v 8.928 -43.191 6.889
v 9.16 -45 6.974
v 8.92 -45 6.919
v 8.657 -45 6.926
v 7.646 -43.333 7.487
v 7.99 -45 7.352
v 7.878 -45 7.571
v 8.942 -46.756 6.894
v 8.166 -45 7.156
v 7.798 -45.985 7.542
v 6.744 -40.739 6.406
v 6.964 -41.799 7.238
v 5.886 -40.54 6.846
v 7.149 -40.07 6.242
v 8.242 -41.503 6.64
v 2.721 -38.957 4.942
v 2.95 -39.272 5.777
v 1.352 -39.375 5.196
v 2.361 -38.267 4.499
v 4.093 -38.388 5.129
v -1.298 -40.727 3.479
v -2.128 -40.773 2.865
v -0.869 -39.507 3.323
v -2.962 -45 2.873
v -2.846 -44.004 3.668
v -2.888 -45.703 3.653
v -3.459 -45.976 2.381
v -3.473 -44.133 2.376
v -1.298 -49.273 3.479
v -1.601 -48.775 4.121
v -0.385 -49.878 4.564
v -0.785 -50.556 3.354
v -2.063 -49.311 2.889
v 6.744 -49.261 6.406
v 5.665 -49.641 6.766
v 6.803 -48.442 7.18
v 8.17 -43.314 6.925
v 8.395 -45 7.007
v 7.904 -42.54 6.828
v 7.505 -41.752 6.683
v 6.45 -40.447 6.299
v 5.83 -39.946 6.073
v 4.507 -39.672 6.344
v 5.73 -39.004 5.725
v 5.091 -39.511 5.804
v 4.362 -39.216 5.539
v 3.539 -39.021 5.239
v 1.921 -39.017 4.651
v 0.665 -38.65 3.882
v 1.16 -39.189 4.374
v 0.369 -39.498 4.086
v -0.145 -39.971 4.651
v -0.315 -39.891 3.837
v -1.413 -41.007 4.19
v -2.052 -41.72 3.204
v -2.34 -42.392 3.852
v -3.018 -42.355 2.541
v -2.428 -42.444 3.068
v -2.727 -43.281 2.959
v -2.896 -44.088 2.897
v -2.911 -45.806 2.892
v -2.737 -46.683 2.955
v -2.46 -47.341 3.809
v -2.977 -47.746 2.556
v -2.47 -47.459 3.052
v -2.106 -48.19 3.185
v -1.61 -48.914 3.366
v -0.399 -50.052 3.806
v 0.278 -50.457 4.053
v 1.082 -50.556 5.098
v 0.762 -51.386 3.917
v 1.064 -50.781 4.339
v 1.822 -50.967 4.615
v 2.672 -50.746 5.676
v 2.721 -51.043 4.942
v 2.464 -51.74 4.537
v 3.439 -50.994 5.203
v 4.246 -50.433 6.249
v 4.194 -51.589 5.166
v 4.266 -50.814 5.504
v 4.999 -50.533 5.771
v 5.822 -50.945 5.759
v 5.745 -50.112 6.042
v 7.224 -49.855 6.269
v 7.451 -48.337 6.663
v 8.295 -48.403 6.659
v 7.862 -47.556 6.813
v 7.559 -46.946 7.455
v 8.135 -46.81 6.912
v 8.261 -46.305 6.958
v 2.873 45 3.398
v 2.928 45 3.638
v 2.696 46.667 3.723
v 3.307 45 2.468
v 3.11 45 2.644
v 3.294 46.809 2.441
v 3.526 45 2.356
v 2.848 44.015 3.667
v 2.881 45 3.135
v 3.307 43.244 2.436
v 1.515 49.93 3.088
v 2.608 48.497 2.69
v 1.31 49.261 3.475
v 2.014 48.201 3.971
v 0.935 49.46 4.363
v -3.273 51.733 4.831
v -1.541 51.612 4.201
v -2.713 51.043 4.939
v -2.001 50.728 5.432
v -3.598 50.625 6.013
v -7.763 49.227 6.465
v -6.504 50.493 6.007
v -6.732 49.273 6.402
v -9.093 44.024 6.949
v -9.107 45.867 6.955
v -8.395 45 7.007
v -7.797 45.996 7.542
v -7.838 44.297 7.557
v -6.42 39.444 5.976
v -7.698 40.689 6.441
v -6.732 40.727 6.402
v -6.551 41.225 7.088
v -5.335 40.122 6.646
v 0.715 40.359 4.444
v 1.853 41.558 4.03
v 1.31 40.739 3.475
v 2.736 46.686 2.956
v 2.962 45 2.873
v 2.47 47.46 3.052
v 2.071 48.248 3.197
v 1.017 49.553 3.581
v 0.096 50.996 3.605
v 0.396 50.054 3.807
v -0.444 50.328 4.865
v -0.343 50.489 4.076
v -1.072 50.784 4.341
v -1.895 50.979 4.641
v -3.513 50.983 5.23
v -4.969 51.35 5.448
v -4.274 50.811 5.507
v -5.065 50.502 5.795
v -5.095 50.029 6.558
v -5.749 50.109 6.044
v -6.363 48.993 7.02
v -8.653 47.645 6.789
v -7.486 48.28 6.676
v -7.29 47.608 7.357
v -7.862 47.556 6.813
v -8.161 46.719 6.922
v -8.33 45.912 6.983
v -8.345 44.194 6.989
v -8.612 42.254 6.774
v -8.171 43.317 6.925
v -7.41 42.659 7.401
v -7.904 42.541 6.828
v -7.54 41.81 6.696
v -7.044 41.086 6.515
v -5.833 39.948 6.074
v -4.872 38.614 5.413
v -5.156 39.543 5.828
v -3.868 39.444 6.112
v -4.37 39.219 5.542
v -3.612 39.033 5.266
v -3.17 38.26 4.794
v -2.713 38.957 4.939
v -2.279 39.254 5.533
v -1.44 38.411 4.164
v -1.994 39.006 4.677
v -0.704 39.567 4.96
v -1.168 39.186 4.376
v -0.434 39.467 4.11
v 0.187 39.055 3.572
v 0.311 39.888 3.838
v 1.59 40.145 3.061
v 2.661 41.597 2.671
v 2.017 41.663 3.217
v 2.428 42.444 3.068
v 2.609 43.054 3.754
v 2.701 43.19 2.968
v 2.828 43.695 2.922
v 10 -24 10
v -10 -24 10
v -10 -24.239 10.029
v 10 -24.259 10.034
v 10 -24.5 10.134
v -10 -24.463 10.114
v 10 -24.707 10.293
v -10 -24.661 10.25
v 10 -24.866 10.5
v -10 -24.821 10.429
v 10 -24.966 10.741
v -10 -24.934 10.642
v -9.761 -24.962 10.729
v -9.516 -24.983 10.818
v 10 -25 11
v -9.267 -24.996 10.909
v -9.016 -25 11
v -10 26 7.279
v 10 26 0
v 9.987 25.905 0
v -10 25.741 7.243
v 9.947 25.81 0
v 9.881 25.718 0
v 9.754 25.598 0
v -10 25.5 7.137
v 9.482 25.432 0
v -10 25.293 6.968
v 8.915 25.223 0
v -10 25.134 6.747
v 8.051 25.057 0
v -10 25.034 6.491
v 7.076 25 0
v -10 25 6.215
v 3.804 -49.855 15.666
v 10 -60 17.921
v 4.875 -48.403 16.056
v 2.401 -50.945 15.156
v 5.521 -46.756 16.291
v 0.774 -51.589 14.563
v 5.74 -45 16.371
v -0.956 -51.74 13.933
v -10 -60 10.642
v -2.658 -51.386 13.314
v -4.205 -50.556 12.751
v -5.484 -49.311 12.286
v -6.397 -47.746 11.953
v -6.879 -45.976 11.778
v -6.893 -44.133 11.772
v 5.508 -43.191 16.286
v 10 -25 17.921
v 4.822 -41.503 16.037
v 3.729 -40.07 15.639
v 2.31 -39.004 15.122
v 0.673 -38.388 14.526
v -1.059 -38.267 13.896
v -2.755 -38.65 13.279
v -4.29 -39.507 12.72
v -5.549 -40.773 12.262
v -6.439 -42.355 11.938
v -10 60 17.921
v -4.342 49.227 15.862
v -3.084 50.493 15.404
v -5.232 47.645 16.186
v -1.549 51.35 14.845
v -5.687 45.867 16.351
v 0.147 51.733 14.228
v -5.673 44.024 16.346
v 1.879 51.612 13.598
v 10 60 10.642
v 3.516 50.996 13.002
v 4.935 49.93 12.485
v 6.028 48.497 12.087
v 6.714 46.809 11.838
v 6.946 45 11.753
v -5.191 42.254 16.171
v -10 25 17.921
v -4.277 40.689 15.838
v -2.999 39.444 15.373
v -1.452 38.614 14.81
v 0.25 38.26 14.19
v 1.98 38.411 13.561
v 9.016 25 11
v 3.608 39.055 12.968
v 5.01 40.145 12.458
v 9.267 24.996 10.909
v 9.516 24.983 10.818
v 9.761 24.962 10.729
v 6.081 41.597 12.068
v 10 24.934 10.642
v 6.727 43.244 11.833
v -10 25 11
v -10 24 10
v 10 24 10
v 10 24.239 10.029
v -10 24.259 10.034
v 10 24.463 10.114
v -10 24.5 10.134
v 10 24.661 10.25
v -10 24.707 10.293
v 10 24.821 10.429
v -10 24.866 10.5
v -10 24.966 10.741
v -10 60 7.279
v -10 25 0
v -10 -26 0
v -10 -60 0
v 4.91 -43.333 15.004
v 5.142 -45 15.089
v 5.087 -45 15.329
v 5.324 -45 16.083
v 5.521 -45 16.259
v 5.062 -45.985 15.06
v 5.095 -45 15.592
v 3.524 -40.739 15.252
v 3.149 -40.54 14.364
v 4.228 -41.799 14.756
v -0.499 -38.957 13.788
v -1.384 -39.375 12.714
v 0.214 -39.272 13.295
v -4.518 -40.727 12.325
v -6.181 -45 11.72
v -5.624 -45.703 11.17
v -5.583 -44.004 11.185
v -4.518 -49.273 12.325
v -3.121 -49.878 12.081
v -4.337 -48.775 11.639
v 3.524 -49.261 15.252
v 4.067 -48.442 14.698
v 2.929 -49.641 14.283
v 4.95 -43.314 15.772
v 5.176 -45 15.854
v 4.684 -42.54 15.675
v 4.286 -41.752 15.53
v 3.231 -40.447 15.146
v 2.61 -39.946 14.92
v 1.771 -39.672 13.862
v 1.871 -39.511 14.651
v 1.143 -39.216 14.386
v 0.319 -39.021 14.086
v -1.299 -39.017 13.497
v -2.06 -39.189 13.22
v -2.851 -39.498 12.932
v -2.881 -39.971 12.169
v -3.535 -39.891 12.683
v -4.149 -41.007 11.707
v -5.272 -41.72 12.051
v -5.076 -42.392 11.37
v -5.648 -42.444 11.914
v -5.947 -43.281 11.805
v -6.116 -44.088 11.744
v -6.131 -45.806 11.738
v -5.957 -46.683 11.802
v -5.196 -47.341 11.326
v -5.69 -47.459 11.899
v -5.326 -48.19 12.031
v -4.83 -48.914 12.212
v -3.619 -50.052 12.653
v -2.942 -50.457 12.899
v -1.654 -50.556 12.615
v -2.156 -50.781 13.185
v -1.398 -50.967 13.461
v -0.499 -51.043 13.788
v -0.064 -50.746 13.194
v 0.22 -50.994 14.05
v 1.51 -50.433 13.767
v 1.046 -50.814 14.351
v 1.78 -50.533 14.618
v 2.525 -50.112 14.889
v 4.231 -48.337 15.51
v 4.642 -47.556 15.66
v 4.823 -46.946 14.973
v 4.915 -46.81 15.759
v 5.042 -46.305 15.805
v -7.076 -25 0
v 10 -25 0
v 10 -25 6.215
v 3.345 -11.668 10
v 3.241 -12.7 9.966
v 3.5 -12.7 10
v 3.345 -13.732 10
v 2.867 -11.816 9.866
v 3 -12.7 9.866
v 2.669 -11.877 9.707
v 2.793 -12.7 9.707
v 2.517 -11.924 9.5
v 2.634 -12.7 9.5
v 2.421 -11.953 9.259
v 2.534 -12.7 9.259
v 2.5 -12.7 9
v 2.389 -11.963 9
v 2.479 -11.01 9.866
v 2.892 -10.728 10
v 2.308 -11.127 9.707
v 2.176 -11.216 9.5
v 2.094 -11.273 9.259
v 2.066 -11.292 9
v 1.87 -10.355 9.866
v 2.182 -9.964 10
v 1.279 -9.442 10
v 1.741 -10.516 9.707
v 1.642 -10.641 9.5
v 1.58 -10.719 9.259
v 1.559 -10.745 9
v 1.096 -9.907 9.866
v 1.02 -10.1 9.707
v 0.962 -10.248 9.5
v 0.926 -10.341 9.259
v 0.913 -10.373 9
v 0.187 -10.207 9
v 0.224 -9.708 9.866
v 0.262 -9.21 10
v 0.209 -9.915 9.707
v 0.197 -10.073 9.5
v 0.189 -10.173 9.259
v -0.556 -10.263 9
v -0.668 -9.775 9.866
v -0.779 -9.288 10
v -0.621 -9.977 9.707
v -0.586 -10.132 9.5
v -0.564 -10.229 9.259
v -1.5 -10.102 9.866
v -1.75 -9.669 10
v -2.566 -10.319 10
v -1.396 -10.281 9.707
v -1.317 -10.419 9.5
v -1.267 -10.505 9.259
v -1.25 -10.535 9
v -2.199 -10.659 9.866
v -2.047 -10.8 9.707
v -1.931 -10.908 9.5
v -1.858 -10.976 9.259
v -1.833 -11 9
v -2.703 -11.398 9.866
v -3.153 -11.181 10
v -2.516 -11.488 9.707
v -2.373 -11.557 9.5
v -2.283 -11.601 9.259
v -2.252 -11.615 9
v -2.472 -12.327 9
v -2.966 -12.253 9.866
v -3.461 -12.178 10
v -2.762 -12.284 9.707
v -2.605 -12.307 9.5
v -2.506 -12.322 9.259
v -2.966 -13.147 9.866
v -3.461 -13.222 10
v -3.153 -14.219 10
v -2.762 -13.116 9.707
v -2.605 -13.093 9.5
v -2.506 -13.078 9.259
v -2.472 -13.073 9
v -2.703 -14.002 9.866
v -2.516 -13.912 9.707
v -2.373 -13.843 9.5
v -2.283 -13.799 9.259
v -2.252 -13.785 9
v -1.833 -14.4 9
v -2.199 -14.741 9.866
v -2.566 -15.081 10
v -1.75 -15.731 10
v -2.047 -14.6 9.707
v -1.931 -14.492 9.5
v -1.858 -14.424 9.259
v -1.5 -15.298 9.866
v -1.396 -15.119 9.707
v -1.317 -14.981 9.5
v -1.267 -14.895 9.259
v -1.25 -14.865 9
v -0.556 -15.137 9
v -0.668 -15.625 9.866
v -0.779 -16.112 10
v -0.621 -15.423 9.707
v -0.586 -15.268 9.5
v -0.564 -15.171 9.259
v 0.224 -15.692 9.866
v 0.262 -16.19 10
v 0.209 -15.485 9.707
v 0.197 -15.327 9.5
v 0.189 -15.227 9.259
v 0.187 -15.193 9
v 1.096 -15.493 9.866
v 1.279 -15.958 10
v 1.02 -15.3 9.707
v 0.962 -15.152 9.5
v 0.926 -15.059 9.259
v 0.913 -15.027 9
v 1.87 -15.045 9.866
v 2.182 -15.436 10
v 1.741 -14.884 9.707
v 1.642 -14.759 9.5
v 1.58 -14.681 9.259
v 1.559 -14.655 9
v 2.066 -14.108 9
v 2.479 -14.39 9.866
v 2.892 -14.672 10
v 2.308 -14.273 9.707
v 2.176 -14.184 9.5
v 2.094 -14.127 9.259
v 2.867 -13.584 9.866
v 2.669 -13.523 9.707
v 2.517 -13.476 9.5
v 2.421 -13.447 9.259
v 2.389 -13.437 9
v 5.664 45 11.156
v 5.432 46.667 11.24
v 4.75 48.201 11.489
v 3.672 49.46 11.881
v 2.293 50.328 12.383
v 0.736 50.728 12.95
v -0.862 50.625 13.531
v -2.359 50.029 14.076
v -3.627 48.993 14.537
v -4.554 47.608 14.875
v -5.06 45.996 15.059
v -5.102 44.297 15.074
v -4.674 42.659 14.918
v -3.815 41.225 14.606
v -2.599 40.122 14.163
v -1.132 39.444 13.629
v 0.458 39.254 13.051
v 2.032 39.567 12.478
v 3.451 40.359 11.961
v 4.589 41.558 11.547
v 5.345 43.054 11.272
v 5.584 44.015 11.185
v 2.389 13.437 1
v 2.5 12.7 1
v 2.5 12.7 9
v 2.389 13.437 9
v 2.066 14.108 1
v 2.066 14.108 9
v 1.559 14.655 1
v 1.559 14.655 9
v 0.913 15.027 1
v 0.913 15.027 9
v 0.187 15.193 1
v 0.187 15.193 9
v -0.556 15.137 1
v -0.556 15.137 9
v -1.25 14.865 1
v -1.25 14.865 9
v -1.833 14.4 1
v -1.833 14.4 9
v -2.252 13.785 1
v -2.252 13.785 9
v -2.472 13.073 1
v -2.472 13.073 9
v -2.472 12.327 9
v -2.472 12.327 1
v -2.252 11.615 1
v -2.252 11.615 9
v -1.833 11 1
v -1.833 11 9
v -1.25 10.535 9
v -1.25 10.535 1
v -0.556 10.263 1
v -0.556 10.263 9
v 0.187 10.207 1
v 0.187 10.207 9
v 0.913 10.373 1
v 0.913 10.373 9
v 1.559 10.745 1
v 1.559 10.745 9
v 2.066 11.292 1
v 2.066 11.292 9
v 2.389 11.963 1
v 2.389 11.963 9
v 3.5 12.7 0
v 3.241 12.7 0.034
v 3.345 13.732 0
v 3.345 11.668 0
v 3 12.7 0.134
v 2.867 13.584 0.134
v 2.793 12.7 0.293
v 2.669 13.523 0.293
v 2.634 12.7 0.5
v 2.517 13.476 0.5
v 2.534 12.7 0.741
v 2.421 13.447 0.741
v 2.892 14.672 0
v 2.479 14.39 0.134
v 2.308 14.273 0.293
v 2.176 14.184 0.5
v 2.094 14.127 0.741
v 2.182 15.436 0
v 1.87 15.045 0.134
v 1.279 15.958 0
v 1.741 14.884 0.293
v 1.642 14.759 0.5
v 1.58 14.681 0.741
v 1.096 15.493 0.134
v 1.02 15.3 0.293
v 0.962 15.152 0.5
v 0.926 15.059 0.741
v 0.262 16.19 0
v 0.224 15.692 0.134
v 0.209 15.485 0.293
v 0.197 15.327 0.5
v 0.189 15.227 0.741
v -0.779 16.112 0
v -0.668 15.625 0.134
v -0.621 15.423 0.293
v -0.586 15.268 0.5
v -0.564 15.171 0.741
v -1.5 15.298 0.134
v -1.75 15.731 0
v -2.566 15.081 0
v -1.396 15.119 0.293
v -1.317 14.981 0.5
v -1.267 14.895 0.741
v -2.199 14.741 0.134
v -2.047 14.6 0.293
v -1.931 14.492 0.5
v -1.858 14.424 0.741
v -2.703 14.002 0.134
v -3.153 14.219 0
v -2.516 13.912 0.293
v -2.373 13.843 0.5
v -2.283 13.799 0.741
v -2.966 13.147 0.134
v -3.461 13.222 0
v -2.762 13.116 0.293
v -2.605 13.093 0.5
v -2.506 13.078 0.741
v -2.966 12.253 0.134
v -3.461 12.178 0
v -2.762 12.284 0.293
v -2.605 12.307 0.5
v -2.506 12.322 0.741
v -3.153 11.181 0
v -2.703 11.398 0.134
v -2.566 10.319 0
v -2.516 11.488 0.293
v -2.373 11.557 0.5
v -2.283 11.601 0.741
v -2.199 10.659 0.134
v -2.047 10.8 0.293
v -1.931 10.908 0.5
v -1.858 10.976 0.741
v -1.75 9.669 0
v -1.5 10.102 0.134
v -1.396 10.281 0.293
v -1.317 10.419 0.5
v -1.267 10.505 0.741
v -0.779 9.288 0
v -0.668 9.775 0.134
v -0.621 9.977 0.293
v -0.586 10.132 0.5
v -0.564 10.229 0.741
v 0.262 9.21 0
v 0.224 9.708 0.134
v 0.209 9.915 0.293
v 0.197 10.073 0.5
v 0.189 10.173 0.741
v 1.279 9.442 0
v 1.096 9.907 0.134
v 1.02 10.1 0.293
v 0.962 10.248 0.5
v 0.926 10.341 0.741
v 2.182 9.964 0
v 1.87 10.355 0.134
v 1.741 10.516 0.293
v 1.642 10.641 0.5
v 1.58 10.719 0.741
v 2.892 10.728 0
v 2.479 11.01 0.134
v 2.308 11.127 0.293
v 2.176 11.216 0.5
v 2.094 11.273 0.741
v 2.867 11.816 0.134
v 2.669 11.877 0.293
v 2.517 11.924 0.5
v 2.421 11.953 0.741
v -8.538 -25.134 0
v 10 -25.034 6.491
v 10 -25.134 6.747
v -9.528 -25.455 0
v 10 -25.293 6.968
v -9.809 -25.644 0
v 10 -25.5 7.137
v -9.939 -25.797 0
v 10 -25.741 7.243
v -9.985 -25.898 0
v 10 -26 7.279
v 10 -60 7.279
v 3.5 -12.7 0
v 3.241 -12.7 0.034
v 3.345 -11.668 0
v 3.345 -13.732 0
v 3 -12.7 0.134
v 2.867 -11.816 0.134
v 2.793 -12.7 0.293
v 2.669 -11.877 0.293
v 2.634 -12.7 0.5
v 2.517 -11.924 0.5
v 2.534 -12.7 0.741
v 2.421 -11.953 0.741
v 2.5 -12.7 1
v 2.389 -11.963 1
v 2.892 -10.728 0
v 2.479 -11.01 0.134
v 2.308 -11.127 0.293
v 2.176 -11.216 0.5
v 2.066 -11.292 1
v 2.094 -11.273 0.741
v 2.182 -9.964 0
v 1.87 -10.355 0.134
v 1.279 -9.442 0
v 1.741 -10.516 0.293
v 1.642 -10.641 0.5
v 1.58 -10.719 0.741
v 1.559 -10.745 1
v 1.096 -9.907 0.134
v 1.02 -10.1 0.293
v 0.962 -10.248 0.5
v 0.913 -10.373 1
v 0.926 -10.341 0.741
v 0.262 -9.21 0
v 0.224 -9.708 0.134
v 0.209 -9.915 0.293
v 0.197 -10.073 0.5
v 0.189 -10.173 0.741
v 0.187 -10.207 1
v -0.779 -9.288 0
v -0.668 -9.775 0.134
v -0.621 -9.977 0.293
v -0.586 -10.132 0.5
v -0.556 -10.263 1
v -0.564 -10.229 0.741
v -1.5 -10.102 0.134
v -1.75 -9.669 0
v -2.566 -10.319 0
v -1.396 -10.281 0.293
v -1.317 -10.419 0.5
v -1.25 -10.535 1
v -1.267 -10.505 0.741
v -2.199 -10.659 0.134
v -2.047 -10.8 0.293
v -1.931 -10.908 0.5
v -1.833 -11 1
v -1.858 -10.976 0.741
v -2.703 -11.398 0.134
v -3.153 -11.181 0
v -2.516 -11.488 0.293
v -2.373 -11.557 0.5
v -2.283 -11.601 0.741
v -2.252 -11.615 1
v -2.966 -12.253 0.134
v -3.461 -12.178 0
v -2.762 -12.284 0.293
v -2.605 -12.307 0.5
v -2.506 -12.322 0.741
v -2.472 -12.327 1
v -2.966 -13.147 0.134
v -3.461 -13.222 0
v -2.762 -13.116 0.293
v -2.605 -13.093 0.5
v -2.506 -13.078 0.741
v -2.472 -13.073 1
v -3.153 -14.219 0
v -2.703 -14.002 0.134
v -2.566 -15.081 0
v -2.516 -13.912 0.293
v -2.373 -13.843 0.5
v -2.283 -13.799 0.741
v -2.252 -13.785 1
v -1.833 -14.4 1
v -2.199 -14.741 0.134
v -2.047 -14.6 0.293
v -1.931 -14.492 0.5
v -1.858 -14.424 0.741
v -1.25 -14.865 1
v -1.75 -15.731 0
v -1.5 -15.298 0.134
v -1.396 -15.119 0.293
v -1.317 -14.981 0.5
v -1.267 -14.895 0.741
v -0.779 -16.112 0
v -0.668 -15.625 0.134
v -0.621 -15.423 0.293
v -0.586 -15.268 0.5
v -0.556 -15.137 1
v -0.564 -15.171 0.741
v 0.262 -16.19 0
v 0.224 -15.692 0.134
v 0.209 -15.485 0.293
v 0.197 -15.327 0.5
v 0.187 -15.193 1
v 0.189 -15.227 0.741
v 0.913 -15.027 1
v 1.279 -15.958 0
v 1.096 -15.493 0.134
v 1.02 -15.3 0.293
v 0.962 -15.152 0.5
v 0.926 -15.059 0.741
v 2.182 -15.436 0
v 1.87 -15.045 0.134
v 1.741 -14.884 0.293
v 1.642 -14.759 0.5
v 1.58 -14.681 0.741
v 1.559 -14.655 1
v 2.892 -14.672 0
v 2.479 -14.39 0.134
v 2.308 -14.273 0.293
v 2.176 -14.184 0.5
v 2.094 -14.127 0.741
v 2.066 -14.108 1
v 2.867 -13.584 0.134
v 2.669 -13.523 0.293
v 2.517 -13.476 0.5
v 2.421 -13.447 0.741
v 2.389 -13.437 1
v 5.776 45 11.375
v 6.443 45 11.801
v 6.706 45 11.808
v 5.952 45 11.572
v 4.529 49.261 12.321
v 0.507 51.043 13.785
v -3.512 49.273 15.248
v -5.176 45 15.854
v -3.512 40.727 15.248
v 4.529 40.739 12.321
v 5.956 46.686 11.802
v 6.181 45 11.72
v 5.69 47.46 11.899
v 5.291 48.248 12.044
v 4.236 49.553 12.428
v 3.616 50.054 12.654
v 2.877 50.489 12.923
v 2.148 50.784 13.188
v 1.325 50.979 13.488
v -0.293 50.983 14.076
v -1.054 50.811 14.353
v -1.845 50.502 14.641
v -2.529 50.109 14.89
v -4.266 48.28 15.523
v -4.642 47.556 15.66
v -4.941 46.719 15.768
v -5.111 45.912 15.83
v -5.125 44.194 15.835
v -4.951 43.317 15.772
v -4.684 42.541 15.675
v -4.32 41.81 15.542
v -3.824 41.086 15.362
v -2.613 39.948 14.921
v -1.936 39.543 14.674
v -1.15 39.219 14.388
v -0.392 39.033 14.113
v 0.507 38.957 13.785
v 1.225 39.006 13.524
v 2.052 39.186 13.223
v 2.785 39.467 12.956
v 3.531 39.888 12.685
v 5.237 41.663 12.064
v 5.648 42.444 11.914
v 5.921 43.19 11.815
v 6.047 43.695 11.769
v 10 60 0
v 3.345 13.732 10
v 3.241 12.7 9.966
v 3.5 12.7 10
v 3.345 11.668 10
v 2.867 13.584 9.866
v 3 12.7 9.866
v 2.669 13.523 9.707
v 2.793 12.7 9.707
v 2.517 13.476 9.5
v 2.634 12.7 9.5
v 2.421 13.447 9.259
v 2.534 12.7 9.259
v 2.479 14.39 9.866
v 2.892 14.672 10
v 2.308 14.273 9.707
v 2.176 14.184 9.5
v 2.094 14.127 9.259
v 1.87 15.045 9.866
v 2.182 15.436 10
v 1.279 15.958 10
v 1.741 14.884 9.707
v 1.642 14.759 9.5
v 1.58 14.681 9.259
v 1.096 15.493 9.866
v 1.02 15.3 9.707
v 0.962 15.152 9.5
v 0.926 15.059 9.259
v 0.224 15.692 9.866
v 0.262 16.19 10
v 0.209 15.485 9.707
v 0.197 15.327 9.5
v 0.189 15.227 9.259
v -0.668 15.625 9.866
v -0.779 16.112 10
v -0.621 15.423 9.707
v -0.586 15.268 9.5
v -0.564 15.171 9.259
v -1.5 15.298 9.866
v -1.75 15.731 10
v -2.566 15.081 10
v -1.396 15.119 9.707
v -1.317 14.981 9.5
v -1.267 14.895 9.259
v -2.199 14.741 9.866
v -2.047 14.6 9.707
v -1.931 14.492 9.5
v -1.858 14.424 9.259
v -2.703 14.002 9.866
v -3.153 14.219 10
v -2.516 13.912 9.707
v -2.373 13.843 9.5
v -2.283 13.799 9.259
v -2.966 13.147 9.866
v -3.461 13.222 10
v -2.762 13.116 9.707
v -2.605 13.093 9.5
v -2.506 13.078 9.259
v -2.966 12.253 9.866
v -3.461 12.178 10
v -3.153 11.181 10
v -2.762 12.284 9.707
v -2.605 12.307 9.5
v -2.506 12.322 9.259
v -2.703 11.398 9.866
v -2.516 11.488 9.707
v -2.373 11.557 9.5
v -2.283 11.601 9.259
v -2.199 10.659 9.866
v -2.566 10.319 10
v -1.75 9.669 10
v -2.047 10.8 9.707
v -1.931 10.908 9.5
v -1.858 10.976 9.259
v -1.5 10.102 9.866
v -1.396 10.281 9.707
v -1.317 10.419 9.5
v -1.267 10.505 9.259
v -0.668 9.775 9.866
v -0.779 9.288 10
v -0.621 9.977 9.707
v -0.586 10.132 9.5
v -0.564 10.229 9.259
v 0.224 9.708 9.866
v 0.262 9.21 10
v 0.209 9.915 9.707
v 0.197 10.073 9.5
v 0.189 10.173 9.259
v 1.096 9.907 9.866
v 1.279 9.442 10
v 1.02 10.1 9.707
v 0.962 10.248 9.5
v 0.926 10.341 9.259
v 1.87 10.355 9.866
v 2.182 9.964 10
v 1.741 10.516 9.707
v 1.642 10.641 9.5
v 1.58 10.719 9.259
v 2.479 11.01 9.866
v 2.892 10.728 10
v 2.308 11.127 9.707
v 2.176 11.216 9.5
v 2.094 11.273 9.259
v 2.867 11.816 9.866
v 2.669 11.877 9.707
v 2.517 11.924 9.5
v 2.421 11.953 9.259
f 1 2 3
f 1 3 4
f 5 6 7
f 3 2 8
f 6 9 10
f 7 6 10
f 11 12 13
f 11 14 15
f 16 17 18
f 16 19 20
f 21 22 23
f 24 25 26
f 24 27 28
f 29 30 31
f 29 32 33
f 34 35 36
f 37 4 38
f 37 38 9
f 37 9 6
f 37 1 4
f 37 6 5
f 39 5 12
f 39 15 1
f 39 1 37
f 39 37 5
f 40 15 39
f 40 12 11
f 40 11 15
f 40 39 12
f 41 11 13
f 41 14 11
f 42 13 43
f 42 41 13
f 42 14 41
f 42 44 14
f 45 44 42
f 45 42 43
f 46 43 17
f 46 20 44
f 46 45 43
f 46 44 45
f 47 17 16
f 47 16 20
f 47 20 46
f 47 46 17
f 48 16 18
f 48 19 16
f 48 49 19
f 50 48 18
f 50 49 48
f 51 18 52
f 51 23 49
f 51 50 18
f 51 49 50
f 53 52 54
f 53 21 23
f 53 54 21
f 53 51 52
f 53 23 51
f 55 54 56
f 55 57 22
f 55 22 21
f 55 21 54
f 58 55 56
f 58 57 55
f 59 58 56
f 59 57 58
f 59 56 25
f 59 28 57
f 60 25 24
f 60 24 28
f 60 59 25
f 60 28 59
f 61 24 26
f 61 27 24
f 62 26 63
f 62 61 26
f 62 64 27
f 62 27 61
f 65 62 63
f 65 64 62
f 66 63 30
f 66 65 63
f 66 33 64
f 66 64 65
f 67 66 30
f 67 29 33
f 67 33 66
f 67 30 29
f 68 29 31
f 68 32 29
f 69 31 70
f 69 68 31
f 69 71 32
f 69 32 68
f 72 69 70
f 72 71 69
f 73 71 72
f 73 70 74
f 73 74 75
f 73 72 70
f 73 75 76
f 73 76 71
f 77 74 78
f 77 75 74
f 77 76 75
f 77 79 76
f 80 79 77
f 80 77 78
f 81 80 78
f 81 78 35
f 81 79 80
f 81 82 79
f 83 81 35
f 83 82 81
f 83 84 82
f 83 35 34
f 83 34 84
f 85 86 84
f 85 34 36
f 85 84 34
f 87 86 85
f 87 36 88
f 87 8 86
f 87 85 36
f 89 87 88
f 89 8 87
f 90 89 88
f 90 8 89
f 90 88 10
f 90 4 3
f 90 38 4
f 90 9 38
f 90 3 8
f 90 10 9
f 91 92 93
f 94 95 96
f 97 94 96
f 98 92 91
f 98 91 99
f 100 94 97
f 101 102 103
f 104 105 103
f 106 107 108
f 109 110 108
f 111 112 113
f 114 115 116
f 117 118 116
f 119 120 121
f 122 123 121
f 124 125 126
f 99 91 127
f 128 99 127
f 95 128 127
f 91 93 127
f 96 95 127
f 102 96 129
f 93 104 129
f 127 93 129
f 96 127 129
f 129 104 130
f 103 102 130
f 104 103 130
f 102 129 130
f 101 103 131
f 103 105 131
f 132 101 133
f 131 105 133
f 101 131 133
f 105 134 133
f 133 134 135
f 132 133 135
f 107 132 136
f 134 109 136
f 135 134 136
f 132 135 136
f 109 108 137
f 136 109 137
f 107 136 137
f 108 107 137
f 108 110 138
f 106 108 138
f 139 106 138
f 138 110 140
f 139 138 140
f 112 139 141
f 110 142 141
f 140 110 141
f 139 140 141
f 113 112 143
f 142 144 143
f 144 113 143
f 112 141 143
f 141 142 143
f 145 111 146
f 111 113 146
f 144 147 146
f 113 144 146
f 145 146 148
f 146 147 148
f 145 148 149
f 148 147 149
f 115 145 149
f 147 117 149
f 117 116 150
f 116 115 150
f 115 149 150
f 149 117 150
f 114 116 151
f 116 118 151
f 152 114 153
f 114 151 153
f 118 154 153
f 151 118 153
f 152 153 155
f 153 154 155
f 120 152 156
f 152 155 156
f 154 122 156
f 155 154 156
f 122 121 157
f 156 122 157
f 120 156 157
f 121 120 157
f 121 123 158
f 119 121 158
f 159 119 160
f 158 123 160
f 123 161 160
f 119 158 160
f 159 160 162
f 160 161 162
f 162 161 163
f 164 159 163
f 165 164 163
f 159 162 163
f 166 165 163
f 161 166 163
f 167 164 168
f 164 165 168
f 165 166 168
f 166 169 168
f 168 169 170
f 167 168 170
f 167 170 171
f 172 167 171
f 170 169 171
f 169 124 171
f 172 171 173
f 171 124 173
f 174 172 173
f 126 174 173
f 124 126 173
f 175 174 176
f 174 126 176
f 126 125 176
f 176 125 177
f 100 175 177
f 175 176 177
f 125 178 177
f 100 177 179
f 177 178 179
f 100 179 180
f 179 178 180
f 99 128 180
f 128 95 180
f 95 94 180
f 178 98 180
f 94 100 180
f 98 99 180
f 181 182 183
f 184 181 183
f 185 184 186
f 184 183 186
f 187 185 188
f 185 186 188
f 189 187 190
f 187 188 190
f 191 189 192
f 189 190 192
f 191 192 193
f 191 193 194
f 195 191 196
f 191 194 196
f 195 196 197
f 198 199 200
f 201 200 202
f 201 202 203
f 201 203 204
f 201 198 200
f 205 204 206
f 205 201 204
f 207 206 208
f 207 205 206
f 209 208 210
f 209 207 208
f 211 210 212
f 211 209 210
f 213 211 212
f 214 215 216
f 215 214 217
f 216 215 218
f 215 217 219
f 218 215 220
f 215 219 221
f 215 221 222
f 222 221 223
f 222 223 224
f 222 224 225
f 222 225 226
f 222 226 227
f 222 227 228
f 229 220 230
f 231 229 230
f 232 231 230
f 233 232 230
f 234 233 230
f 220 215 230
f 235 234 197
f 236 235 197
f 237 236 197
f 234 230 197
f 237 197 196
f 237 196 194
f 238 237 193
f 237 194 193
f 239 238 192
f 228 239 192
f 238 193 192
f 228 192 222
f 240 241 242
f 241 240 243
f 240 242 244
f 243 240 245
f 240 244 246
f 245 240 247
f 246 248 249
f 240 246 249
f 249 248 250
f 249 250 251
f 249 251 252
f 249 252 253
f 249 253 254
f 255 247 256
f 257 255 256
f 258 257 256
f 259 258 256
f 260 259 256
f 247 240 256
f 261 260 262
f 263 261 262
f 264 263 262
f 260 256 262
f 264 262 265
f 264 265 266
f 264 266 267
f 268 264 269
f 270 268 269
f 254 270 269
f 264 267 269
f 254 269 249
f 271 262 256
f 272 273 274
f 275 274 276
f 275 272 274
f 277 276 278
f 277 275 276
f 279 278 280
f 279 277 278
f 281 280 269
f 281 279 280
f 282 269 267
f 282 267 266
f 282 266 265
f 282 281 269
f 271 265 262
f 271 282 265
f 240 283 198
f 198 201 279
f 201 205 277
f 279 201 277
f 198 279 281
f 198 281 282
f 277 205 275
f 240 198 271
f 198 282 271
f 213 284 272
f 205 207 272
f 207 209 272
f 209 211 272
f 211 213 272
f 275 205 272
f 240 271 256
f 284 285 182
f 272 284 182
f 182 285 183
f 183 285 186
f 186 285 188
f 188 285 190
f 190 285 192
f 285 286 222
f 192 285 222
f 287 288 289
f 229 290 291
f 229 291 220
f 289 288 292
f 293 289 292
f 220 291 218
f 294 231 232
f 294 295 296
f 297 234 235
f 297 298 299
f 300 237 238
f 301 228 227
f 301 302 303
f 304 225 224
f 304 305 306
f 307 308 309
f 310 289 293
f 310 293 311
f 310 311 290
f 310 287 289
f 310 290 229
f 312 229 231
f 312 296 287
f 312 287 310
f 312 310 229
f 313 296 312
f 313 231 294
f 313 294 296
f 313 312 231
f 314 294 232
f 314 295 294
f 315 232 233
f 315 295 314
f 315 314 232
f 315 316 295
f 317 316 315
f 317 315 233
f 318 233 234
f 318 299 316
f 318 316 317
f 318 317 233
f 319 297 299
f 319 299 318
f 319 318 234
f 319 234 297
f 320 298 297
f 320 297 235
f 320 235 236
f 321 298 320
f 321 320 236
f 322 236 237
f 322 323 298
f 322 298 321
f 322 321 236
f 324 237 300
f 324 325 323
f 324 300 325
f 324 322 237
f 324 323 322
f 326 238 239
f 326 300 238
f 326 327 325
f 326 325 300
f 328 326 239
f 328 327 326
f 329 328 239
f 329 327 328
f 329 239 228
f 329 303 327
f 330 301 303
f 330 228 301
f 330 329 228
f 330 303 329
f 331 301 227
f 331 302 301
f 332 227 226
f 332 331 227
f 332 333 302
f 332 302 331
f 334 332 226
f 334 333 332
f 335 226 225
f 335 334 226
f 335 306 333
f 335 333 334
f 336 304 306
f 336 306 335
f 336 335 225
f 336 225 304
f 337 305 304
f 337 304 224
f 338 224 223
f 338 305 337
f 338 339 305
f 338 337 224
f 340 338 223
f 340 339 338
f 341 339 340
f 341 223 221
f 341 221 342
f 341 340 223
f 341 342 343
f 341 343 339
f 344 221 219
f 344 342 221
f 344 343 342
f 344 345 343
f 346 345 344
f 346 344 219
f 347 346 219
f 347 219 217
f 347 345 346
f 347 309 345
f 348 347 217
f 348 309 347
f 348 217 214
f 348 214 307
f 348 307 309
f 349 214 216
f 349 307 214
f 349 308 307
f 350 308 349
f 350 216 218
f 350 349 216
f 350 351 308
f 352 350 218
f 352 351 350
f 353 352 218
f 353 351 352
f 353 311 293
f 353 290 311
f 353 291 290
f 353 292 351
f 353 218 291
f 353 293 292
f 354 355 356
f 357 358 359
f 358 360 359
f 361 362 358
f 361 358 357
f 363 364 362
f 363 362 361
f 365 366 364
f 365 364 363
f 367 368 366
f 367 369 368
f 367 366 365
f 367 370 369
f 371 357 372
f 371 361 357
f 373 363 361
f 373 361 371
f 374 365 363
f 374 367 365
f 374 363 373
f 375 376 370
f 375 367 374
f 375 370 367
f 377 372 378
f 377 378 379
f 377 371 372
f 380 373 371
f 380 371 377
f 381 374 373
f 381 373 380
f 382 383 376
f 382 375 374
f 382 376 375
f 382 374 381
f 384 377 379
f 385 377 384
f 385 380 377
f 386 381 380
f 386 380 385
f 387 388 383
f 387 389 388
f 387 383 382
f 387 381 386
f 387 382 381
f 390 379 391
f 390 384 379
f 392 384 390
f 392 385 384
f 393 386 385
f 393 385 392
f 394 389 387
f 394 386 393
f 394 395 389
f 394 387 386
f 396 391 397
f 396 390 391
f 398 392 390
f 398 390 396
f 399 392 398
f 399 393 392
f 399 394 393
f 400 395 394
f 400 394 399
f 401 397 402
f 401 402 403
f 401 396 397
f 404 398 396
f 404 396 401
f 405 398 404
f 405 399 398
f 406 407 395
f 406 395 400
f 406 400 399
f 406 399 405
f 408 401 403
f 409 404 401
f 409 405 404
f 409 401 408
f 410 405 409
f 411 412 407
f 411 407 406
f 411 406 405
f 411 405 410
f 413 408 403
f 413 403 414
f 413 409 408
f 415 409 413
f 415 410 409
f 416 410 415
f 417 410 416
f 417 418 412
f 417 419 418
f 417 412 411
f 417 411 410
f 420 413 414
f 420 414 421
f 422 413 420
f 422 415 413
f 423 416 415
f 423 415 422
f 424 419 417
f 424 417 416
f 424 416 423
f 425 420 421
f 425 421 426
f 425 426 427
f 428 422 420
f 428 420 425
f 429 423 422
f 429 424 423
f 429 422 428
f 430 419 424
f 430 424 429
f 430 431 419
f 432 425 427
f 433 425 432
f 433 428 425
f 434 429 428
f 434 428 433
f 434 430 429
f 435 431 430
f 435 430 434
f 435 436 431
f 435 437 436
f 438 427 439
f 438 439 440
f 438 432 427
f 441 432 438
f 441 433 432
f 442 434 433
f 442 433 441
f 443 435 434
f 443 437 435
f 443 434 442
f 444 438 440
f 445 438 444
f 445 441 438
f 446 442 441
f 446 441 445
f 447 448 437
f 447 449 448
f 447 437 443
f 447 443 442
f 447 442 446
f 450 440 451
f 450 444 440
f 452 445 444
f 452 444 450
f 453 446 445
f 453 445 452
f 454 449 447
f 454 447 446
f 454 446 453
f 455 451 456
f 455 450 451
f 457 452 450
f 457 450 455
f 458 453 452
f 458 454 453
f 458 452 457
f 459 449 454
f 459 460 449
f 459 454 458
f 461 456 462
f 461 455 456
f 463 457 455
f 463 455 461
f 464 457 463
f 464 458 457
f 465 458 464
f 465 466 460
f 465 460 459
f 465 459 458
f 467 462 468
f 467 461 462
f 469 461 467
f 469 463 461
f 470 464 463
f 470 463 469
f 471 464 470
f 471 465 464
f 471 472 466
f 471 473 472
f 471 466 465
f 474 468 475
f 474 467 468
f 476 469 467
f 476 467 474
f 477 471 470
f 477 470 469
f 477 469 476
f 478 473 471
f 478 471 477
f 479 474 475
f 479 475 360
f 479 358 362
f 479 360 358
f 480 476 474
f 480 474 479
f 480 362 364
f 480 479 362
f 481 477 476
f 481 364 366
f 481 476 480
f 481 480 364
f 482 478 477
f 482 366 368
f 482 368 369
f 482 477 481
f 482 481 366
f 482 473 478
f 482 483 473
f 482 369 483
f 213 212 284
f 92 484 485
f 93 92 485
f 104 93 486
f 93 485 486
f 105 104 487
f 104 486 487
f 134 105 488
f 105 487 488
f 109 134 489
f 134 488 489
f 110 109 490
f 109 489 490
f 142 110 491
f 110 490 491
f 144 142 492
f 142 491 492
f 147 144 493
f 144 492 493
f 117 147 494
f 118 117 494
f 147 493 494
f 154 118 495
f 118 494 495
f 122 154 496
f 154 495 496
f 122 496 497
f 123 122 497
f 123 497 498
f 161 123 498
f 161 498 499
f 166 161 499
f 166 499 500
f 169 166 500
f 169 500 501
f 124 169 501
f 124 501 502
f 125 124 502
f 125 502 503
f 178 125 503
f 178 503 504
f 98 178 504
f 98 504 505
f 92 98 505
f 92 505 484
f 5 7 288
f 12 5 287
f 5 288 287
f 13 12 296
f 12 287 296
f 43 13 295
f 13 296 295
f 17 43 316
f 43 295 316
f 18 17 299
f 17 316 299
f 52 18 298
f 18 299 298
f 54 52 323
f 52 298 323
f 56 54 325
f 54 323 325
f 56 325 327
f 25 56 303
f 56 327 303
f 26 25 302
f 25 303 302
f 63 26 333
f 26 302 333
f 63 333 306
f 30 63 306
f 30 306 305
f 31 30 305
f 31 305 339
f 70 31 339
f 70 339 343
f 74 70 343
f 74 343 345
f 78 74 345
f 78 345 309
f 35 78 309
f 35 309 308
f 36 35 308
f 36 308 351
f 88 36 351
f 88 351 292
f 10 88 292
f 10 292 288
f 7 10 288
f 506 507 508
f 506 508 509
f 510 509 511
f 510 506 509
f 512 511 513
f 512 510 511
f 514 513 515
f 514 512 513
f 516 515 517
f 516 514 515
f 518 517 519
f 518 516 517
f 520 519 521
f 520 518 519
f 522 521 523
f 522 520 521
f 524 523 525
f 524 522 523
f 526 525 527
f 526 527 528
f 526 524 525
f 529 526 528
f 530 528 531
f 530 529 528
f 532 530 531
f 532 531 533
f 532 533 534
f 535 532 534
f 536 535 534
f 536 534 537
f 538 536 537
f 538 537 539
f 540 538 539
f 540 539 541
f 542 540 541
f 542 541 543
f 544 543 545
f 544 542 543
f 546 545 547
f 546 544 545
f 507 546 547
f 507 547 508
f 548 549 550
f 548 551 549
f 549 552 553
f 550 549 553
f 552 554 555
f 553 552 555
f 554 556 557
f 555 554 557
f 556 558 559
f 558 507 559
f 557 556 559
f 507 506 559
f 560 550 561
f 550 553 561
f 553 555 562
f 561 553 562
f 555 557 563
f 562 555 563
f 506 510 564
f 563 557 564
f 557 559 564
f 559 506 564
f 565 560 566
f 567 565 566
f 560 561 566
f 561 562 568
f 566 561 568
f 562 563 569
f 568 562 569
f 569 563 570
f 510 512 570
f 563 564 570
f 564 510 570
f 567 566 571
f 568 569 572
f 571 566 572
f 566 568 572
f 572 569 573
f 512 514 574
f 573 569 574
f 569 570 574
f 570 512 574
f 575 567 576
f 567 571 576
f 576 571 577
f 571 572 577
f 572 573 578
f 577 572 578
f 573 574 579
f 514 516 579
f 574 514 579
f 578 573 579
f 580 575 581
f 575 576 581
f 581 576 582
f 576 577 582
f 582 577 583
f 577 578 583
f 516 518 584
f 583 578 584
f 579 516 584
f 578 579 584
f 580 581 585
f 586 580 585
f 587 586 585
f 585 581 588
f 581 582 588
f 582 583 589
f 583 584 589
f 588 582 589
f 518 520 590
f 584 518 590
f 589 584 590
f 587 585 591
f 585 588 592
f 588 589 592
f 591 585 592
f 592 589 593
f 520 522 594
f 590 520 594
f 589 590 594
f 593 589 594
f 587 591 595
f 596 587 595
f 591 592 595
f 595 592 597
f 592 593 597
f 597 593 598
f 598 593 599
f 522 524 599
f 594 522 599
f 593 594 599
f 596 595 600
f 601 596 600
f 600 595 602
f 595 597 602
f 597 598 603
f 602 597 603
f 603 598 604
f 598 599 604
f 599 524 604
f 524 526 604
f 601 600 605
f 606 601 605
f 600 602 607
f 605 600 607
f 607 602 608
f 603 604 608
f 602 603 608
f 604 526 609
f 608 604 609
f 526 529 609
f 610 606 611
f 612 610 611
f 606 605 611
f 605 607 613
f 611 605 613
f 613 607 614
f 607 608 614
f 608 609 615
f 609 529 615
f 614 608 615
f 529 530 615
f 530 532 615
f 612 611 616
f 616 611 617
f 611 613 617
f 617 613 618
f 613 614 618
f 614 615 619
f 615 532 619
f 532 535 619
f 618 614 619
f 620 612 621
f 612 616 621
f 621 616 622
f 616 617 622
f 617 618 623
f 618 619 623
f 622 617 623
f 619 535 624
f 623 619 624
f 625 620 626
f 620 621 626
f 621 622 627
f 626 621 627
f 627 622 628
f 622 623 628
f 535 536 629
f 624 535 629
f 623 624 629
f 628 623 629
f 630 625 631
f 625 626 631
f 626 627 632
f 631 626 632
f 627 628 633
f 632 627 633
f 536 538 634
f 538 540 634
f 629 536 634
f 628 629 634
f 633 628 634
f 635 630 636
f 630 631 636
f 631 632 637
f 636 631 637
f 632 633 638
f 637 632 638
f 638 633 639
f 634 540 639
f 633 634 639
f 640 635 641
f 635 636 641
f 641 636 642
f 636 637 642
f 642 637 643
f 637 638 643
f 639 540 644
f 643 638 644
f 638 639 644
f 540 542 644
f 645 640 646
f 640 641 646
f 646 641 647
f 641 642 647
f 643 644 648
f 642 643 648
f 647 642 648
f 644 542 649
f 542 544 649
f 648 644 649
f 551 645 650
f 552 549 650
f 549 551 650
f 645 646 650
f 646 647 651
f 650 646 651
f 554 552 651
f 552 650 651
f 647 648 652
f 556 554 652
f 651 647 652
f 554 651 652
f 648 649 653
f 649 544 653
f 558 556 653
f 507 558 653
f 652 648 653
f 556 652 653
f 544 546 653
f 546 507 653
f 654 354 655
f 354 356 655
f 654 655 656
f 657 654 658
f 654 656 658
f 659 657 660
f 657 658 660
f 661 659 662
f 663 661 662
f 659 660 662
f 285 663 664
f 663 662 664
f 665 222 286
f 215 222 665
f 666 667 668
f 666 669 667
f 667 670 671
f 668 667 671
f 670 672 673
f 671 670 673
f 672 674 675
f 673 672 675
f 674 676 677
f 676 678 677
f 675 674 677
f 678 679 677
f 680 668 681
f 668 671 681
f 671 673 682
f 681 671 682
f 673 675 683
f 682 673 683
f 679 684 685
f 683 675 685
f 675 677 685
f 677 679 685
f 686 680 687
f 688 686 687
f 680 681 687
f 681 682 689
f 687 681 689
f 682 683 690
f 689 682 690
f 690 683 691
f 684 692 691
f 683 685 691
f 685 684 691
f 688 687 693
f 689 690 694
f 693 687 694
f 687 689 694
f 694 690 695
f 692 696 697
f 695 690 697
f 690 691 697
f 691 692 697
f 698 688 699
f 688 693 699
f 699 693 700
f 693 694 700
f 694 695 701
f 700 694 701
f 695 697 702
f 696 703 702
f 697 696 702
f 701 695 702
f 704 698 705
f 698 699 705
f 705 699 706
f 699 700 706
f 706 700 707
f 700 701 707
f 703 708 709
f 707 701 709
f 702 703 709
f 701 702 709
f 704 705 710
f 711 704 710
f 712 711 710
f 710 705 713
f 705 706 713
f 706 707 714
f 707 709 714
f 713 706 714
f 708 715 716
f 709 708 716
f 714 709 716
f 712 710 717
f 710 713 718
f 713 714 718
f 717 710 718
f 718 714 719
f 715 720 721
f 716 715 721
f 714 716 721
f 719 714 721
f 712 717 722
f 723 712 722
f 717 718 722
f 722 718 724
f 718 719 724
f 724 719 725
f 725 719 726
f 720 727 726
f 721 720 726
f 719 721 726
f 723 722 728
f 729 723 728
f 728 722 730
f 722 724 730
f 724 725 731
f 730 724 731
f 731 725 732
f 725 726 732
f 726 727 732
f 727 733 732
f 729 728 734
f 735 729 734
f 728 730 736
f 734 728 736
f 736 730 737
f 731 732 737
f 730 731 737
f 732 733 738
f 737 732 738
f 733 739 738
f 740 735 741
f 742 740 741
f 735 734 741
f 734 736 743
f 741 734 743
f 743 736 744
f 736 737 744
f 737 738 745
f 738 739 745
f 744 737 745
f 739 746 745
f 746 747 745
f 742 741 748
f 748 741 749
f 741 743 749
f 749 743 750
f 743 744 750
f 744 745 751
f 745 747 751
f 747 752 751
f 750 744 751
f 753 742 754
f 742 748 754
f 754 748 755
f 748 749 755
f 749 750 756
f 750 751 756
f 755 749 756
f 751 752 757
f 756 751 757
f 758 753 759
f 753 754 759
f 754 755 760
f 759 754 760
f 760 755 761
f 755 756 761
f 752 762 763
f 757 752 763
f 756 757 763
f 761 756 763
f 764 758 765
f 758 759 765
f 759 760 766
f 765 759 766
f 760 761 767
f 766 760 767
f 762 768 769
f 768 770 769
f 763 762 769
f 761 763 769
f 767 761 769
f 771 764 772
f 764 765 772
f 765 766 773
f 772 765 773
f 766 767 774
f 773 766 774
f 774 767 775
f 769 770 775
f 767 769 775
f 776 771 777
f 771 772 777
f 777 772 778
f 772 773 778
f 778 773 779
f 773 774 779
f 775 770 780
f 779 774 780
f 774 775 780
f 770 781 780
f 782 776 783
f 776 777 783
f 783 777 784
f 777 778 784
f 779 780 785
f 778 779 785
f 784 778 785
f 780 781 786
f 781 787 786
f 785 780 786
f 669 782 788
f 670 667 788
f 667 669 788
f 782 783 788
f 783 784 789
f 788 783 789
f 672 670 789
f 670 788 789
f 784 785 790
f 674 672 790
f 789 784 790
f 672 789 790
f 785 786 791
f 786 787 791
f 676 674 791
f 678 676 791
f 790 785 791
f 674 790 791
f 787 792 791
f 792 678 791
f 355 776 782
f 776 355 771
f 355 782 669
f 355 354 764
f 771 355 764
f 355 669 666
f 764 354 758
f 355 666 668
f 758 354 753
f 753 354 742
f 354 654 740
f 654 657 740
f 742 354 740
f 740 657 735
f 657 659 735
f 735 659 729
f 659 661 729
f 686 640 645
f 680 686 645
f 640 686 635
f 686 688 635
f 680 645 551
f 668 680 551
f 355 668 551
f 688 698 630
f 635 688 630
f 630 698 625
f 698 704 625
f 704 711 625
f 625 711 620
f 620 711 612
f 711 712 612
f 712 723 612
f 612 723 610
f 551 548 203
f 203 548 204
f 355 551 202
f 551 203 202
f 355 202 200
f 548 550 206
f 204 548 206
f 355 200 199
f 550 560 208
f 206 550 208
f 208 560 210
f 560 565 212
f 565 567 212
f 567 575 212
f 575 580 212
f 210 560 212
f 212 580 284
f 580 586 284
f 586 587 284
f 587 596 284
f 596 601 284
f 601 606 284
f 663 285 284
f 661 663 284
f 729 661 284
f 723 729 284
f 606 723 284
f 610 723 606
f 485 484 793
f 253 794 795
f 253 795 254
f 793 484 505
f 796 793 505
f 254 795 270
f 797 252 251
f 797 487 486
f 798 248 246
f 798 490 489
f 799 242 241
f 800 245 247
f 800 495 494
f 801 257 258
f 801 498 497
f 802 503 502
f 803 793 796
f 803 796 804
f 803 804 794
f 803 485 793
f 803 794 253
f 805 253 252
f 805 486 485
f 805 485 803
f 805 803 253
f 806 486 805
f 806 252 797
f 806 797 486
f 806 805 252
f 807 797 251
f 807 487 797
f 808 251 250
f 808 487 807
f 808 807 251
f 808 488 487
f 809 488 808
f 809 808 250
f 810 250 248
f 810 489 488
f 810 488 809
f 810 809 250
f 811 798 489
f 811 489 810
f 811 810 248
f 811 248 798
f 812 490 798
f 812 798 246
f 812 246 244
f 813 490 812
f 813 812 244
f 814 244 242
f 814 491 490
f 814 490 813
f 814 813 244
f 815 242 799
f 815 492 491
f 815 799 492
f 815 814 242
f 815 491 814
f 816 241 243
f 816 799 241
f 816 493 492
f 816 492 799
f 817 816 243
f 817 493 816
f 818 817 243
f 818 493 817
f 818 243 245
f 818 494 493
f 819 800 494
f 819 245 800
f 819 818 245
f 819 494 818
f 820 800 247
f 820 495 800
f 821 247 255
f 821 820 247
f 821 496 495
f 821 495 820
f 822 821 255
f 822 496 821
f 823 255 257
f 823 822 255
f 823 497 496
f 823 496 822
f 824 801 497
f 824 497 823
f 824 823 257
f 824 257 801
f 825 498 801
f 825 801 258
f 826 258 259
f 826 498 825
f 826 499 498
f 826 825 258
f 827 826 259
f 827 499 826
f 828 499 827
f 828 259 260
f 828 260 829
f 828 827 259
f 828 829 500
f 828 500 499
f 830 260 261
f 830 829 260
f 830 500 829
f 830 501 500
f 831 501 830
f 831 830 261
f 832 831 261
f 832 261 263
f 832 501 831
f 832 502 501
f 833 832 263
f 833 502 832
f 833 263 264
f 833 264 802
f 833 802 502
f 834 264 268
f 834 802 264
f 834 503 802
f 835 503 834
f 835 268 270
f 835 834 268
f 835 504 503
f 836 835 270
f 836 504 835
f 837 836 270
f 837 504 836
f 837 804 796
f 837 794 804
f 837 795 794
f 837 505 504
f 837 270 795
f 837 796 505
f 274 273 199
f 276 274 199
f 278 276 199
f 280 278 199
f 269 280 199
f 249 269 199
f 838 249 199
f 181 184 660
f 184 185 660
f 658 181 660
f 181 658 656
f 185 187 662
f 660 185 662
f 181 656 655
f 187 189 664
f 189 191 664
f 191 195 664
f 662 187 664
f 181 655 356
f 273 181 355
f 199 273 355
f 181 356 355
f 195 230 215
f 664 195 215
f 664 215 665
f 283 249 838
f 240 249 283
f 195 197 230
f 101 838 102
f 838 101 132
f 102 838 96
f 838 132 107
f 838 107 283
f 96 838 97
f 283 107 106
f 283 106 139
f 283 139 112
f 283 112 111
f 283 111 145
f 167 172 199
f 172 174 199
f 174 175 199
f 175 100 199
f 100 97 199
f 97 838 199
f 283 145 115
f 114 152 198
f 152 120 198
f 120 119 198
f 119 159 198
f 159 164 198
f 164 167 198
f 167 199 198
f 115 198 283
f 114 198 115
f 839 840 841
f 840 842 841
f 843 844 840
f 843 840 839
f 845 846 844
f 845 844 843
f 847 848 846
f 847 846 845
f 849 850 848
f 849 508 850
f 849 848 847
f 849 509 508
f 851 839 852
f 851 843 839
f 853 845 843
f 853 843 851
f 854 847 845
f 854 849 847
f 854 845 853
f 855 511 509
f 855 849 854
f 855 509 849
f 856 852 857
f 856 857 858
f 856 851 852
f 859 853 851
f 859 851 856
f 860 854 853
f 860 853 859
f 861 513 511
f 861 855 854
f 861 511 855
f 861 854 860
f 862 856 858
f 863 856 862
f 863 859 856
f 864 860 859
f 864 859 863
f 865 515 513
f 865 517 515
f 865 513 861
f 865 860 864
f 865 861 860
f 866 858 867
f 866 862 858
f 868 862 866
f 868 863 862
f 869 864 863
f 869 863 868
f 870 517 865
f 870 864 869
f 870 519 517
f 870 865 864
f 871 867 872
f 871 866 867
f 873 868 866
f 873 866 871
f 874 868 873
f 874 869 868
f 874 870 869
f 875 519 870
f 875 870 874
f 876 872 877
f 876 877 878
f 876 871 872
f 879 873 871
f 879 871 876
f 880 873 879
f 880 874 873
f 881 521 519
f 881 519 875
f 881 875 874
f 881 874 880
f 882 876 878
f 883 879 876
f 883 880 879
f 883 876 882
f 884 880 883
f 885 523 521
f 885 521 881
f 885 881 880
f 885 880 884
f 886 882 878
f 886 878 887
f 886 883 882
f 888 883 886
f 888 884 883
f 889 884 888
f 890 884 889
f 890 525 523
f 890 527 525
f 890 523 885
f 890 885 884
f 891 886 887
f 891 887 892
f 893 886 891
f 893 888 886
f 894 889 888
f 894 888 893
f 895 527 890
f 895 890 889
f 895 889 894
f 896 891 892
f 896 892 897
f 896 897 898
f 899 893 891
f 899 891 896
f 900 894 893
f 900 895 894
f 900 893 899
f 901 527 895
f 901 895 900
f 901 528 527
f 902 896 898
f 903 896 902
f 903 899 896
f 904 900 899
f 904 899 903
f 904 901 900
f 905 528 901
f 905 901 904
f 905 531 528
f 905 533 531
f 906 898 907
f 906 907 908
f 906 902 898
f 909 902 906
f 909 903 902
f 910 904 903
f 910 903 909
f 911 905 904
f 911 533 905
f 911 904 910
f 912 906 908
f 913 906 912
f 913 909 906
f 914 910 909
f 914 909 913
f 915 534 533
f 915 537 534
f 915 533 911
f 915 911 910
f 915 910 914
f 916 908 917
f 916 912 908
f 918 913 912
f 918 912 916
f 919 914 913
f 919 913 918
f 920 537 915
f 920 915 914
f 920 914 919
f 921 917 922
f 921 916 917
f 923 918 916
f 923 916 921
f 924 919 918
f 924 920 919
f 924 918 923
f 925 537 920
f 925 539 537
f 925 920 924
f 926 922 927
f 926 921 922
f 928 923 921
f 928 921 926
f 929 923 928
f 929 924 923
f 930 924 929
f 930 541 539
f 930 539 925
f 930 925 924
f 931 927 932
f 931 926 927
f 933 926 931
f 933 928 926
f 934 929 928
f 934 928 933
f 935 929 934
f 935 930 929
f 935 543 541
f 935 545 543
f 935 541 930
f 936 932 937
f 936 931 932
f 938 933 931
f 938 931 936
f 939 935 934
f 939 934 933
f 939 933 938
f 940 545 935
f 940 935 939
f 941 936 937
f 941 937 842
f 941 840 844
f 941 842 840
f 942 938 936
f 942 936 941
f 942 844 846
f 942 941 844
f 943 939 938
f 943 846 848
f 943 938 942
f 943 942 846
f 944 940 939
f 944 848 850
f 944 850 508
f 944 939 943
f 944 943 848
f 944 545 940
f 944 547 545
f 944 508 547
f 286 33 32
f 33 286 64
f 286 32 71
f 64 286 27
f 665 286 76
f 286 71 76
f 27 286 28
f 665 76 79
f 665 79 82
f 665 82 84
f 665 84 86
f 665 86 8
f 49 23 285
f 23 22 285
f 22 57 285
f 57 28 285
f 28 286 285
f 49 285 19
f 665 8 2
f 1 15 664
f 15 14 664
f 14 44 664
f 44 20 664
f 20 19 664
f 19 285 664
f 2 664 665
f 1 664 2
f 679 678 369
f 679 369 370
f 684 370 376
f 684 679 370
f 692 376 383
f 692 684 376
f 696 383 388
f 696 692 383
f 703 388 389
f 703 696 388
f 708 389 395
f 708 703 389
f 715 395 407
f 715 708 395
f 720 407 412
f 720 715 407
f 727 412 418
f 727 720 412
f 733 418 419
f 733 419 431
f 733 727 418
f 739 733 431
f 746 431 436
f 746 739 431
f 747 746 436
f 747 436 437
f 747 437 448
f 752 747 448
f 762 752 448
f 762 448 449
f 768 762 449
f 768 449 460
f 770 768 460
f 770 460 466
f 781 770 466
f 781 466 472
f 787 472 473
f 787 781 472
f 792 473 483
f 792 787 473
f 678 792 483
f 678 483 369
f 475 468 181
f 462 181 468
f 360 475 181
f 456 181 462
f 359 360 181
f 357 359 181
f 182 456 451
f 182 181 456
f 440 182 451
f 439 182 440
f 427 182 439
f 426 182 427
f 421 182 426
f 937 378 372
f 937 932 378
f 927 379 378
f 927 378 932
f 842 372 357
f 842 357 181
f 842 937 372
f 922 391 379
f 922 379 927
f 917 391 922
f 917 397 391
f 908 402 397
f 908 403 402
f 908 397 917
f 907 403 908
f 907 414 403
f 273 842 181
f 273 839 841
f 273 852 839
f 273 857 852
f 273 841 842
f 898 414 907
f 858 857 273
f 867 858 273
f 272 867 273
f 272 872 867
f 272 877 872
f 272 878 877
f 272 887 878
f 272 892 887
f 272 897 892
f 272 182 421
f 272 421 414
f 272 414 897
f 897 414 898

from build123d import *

# Parameters (mm, degrees)
SKETCH1_W           = 50
SKETCH1_H           = 20
SKETCH1_R           = 2.5
BOSS_EXTRUDE1_DEPTH = 10
BOSS_EXTRUDE2_DEPTH = 35
SKETCH4_R           = 5.75
CUT_EXTRUDE1_DEPTH  = 35
BOSS_EXTRUDE3_DEPTH = 35
SKETCH6_R           = 5.75
CUT_EXTRUDE2_DEPTH  = 35
FILLET1_R           = 1
FILLET2_R           = 1
FILLET3_R           = 1
FILLET4_R           = 1
FILLET5_R           = 1
FILLET6_R           = 1
FILLET7_R           = 1
FILLET8_R           = 1
FILLET9_R           = 1
FILLET10_R          = 1
FILLET11_R          = 1
FILLET12_R          = 1


with BuildPart() as part:
    # Sketch1 → Boss-Extrude1 (new body)
    with BuildSketch(Plane(origin=(0, 0, 0), x_dir=(0, 1, 0), z_dir=(0, 0, 1))):
        Rectangle(SKETCH1_W, SKETCH1_H)
        with Locations(Location((-12.7, 0, 0), (0, 0, 270))):
            Circle(SKETCH1_R, mode=Mode.SUBTRACT)
        with Locations(Location((12.7, 0, 0), (0, 0, 270))):
            Circle(SKETCH1_R, mode=Mode.SUBTRACT)
    extrude(amount=BOSS_EXTRUDE1_DEPTH)

    # Sketch3 → Boss-Extrude2 (add)
    with BuildSketch(Plane.XZ.offset(25)):
        Polygon((10, 7.279404685), (10, 17.92118241), (-10, 10.641777725), (-10, 0), align=None)
    extrude(amount=BOSS_EXTRUDE2_DEPTH)

    # Sketch4 → Cut-Extrude1 (cut)
    with BuildSketch(Plane(origin=(-4.589979218, 0, 12.610864256), x_dir=(0.9396926207859081, 0, 0.3420201433256699), z_dir=(-0.3420201433256699, 0, 0.9396926207859081))):
        with Locations((4.242776135, -45)):
            Circle(SKETCH4_R)
    extrude(amount=-CUT_EXTRUDE1_DEPTH, mode=Mode.SUBTRACT)

    # Sketch5 → Boss-Extrude3 (add)
    with BuildSketch(Plane(origin=(0, 25, 0), x_dir=(-1, 0, 0), z_dir=(0, 1, 0))):
        Polygon((-10, 0), (10, 7.279404685), (10, 17.92118241), (-10, 10.641777725), align=None)
    extrude(amount=BOSS_EXTRUDE3_DEPTH)

    # Sketch6 → Cut-Extrude2 (cut)
    with BuildSketch(Plane(origin=(4.589979218, 0, 12.610864256), x_dir=(0.9396926207859081, 0, -0.3420201433256698), z_dir=(0.3420201433256698, 0, 0.9396926207859081))):
        with Locations((-4.242776135, 45)):
            Circle(SKETCH6_R)
    extrude(amount=-CUT_EXTRUDE2_DEPTH, mode=Mode.SUBTRACT)

    # Fillet1
    fillet1_edges = [part.edges().sort_by_distance(p)[0] for p in [
        (-2.5, 12.7, 0),
    ]]
    fillet(fillet1_edges, radius=FILLET1_R)

    # Fillet2
    fillet2_edges = [part.edges().sort_by_distance(p)[0] for p in [
        (0, 25, 10),
    ]]
    fillet(fillet2_edges, radius=FILLET2_R)

    # Fillet3
    fillet3_edges = [part.edges().sort_by_distance(p)[0] for p in [
        (0, -25, 3.639702343),
    ]]
    fillet(fillet3_edges, radius=FILLET3_R)

    # Fillet4
    fillet4_edges = [part.edges().sort_by_distance(p)[0] for p in [
        (0, -25, 10),
    ]]
    fillet(fillet4_edges, radius=FILLET4_R)

    # Fillet5
    fillet5_edges = [part.edges().sort_by_distance(p)[0] for p in [
        (0, 25, 3.639702343),
    ]]
    fillet(fillet5_edges, radius=FILLET5_R)

    # Fillet6
    fillet6_edges = [part.edges().sort_by_distance(p)[0] for p in [
        (-8.220360211, 45, 6.631668774),
    ]]
    fillet(fillet6_edges, radius=FILLET6_R)

    # Fillet7
    fillet7_edges = [part.edges().sort_by_distance(p)[0] for p in [
        (-4.800158777, 45, 16.028594982),
    ]]
    fillet(fillet7_edges, radius=FILLET7_R)

    # Fillet8
    fillet8_edges = [part.edges().sort_by_distance(p)[0] for p in [
        (-2.586104928, -45, 2.698437126),
    ]]
    fillet(fillet8_edges, radius=FILLET8_R)

    # Fillet9
    fillet9_edges = [part.edges().sort_by_distance(p)[0] for p in [
        (-6.006306362, -45, 12.095363334),
    ]]
    fillet(fillet9_edges, radius=FILLET9_R)

    # Fillet10
    fillet10_edges = [part.edges().sort_by_distance(p)[0] for p in [
        (-2.5, -12.7, 0),
    ]]
    fillet(fillet10_edges, radius=FILLET10_R)

    # Fillet11
    fillet11_edges = [part.edges().sort_by_distance(p)[0] for p in [
        (-2.5, 12.7, 10),
    ]]
    fillet(fillet11_edges, radius=FILLET11_R)

    # Fillet12
    fillet12_edges = [part.edges().sort_by_distance(p)[0] for p in [
        (-2.5, -12.7, 10),
    ]]
    fillet(fillet12_edges, radius=FILLET12_R)


solid = part.part
